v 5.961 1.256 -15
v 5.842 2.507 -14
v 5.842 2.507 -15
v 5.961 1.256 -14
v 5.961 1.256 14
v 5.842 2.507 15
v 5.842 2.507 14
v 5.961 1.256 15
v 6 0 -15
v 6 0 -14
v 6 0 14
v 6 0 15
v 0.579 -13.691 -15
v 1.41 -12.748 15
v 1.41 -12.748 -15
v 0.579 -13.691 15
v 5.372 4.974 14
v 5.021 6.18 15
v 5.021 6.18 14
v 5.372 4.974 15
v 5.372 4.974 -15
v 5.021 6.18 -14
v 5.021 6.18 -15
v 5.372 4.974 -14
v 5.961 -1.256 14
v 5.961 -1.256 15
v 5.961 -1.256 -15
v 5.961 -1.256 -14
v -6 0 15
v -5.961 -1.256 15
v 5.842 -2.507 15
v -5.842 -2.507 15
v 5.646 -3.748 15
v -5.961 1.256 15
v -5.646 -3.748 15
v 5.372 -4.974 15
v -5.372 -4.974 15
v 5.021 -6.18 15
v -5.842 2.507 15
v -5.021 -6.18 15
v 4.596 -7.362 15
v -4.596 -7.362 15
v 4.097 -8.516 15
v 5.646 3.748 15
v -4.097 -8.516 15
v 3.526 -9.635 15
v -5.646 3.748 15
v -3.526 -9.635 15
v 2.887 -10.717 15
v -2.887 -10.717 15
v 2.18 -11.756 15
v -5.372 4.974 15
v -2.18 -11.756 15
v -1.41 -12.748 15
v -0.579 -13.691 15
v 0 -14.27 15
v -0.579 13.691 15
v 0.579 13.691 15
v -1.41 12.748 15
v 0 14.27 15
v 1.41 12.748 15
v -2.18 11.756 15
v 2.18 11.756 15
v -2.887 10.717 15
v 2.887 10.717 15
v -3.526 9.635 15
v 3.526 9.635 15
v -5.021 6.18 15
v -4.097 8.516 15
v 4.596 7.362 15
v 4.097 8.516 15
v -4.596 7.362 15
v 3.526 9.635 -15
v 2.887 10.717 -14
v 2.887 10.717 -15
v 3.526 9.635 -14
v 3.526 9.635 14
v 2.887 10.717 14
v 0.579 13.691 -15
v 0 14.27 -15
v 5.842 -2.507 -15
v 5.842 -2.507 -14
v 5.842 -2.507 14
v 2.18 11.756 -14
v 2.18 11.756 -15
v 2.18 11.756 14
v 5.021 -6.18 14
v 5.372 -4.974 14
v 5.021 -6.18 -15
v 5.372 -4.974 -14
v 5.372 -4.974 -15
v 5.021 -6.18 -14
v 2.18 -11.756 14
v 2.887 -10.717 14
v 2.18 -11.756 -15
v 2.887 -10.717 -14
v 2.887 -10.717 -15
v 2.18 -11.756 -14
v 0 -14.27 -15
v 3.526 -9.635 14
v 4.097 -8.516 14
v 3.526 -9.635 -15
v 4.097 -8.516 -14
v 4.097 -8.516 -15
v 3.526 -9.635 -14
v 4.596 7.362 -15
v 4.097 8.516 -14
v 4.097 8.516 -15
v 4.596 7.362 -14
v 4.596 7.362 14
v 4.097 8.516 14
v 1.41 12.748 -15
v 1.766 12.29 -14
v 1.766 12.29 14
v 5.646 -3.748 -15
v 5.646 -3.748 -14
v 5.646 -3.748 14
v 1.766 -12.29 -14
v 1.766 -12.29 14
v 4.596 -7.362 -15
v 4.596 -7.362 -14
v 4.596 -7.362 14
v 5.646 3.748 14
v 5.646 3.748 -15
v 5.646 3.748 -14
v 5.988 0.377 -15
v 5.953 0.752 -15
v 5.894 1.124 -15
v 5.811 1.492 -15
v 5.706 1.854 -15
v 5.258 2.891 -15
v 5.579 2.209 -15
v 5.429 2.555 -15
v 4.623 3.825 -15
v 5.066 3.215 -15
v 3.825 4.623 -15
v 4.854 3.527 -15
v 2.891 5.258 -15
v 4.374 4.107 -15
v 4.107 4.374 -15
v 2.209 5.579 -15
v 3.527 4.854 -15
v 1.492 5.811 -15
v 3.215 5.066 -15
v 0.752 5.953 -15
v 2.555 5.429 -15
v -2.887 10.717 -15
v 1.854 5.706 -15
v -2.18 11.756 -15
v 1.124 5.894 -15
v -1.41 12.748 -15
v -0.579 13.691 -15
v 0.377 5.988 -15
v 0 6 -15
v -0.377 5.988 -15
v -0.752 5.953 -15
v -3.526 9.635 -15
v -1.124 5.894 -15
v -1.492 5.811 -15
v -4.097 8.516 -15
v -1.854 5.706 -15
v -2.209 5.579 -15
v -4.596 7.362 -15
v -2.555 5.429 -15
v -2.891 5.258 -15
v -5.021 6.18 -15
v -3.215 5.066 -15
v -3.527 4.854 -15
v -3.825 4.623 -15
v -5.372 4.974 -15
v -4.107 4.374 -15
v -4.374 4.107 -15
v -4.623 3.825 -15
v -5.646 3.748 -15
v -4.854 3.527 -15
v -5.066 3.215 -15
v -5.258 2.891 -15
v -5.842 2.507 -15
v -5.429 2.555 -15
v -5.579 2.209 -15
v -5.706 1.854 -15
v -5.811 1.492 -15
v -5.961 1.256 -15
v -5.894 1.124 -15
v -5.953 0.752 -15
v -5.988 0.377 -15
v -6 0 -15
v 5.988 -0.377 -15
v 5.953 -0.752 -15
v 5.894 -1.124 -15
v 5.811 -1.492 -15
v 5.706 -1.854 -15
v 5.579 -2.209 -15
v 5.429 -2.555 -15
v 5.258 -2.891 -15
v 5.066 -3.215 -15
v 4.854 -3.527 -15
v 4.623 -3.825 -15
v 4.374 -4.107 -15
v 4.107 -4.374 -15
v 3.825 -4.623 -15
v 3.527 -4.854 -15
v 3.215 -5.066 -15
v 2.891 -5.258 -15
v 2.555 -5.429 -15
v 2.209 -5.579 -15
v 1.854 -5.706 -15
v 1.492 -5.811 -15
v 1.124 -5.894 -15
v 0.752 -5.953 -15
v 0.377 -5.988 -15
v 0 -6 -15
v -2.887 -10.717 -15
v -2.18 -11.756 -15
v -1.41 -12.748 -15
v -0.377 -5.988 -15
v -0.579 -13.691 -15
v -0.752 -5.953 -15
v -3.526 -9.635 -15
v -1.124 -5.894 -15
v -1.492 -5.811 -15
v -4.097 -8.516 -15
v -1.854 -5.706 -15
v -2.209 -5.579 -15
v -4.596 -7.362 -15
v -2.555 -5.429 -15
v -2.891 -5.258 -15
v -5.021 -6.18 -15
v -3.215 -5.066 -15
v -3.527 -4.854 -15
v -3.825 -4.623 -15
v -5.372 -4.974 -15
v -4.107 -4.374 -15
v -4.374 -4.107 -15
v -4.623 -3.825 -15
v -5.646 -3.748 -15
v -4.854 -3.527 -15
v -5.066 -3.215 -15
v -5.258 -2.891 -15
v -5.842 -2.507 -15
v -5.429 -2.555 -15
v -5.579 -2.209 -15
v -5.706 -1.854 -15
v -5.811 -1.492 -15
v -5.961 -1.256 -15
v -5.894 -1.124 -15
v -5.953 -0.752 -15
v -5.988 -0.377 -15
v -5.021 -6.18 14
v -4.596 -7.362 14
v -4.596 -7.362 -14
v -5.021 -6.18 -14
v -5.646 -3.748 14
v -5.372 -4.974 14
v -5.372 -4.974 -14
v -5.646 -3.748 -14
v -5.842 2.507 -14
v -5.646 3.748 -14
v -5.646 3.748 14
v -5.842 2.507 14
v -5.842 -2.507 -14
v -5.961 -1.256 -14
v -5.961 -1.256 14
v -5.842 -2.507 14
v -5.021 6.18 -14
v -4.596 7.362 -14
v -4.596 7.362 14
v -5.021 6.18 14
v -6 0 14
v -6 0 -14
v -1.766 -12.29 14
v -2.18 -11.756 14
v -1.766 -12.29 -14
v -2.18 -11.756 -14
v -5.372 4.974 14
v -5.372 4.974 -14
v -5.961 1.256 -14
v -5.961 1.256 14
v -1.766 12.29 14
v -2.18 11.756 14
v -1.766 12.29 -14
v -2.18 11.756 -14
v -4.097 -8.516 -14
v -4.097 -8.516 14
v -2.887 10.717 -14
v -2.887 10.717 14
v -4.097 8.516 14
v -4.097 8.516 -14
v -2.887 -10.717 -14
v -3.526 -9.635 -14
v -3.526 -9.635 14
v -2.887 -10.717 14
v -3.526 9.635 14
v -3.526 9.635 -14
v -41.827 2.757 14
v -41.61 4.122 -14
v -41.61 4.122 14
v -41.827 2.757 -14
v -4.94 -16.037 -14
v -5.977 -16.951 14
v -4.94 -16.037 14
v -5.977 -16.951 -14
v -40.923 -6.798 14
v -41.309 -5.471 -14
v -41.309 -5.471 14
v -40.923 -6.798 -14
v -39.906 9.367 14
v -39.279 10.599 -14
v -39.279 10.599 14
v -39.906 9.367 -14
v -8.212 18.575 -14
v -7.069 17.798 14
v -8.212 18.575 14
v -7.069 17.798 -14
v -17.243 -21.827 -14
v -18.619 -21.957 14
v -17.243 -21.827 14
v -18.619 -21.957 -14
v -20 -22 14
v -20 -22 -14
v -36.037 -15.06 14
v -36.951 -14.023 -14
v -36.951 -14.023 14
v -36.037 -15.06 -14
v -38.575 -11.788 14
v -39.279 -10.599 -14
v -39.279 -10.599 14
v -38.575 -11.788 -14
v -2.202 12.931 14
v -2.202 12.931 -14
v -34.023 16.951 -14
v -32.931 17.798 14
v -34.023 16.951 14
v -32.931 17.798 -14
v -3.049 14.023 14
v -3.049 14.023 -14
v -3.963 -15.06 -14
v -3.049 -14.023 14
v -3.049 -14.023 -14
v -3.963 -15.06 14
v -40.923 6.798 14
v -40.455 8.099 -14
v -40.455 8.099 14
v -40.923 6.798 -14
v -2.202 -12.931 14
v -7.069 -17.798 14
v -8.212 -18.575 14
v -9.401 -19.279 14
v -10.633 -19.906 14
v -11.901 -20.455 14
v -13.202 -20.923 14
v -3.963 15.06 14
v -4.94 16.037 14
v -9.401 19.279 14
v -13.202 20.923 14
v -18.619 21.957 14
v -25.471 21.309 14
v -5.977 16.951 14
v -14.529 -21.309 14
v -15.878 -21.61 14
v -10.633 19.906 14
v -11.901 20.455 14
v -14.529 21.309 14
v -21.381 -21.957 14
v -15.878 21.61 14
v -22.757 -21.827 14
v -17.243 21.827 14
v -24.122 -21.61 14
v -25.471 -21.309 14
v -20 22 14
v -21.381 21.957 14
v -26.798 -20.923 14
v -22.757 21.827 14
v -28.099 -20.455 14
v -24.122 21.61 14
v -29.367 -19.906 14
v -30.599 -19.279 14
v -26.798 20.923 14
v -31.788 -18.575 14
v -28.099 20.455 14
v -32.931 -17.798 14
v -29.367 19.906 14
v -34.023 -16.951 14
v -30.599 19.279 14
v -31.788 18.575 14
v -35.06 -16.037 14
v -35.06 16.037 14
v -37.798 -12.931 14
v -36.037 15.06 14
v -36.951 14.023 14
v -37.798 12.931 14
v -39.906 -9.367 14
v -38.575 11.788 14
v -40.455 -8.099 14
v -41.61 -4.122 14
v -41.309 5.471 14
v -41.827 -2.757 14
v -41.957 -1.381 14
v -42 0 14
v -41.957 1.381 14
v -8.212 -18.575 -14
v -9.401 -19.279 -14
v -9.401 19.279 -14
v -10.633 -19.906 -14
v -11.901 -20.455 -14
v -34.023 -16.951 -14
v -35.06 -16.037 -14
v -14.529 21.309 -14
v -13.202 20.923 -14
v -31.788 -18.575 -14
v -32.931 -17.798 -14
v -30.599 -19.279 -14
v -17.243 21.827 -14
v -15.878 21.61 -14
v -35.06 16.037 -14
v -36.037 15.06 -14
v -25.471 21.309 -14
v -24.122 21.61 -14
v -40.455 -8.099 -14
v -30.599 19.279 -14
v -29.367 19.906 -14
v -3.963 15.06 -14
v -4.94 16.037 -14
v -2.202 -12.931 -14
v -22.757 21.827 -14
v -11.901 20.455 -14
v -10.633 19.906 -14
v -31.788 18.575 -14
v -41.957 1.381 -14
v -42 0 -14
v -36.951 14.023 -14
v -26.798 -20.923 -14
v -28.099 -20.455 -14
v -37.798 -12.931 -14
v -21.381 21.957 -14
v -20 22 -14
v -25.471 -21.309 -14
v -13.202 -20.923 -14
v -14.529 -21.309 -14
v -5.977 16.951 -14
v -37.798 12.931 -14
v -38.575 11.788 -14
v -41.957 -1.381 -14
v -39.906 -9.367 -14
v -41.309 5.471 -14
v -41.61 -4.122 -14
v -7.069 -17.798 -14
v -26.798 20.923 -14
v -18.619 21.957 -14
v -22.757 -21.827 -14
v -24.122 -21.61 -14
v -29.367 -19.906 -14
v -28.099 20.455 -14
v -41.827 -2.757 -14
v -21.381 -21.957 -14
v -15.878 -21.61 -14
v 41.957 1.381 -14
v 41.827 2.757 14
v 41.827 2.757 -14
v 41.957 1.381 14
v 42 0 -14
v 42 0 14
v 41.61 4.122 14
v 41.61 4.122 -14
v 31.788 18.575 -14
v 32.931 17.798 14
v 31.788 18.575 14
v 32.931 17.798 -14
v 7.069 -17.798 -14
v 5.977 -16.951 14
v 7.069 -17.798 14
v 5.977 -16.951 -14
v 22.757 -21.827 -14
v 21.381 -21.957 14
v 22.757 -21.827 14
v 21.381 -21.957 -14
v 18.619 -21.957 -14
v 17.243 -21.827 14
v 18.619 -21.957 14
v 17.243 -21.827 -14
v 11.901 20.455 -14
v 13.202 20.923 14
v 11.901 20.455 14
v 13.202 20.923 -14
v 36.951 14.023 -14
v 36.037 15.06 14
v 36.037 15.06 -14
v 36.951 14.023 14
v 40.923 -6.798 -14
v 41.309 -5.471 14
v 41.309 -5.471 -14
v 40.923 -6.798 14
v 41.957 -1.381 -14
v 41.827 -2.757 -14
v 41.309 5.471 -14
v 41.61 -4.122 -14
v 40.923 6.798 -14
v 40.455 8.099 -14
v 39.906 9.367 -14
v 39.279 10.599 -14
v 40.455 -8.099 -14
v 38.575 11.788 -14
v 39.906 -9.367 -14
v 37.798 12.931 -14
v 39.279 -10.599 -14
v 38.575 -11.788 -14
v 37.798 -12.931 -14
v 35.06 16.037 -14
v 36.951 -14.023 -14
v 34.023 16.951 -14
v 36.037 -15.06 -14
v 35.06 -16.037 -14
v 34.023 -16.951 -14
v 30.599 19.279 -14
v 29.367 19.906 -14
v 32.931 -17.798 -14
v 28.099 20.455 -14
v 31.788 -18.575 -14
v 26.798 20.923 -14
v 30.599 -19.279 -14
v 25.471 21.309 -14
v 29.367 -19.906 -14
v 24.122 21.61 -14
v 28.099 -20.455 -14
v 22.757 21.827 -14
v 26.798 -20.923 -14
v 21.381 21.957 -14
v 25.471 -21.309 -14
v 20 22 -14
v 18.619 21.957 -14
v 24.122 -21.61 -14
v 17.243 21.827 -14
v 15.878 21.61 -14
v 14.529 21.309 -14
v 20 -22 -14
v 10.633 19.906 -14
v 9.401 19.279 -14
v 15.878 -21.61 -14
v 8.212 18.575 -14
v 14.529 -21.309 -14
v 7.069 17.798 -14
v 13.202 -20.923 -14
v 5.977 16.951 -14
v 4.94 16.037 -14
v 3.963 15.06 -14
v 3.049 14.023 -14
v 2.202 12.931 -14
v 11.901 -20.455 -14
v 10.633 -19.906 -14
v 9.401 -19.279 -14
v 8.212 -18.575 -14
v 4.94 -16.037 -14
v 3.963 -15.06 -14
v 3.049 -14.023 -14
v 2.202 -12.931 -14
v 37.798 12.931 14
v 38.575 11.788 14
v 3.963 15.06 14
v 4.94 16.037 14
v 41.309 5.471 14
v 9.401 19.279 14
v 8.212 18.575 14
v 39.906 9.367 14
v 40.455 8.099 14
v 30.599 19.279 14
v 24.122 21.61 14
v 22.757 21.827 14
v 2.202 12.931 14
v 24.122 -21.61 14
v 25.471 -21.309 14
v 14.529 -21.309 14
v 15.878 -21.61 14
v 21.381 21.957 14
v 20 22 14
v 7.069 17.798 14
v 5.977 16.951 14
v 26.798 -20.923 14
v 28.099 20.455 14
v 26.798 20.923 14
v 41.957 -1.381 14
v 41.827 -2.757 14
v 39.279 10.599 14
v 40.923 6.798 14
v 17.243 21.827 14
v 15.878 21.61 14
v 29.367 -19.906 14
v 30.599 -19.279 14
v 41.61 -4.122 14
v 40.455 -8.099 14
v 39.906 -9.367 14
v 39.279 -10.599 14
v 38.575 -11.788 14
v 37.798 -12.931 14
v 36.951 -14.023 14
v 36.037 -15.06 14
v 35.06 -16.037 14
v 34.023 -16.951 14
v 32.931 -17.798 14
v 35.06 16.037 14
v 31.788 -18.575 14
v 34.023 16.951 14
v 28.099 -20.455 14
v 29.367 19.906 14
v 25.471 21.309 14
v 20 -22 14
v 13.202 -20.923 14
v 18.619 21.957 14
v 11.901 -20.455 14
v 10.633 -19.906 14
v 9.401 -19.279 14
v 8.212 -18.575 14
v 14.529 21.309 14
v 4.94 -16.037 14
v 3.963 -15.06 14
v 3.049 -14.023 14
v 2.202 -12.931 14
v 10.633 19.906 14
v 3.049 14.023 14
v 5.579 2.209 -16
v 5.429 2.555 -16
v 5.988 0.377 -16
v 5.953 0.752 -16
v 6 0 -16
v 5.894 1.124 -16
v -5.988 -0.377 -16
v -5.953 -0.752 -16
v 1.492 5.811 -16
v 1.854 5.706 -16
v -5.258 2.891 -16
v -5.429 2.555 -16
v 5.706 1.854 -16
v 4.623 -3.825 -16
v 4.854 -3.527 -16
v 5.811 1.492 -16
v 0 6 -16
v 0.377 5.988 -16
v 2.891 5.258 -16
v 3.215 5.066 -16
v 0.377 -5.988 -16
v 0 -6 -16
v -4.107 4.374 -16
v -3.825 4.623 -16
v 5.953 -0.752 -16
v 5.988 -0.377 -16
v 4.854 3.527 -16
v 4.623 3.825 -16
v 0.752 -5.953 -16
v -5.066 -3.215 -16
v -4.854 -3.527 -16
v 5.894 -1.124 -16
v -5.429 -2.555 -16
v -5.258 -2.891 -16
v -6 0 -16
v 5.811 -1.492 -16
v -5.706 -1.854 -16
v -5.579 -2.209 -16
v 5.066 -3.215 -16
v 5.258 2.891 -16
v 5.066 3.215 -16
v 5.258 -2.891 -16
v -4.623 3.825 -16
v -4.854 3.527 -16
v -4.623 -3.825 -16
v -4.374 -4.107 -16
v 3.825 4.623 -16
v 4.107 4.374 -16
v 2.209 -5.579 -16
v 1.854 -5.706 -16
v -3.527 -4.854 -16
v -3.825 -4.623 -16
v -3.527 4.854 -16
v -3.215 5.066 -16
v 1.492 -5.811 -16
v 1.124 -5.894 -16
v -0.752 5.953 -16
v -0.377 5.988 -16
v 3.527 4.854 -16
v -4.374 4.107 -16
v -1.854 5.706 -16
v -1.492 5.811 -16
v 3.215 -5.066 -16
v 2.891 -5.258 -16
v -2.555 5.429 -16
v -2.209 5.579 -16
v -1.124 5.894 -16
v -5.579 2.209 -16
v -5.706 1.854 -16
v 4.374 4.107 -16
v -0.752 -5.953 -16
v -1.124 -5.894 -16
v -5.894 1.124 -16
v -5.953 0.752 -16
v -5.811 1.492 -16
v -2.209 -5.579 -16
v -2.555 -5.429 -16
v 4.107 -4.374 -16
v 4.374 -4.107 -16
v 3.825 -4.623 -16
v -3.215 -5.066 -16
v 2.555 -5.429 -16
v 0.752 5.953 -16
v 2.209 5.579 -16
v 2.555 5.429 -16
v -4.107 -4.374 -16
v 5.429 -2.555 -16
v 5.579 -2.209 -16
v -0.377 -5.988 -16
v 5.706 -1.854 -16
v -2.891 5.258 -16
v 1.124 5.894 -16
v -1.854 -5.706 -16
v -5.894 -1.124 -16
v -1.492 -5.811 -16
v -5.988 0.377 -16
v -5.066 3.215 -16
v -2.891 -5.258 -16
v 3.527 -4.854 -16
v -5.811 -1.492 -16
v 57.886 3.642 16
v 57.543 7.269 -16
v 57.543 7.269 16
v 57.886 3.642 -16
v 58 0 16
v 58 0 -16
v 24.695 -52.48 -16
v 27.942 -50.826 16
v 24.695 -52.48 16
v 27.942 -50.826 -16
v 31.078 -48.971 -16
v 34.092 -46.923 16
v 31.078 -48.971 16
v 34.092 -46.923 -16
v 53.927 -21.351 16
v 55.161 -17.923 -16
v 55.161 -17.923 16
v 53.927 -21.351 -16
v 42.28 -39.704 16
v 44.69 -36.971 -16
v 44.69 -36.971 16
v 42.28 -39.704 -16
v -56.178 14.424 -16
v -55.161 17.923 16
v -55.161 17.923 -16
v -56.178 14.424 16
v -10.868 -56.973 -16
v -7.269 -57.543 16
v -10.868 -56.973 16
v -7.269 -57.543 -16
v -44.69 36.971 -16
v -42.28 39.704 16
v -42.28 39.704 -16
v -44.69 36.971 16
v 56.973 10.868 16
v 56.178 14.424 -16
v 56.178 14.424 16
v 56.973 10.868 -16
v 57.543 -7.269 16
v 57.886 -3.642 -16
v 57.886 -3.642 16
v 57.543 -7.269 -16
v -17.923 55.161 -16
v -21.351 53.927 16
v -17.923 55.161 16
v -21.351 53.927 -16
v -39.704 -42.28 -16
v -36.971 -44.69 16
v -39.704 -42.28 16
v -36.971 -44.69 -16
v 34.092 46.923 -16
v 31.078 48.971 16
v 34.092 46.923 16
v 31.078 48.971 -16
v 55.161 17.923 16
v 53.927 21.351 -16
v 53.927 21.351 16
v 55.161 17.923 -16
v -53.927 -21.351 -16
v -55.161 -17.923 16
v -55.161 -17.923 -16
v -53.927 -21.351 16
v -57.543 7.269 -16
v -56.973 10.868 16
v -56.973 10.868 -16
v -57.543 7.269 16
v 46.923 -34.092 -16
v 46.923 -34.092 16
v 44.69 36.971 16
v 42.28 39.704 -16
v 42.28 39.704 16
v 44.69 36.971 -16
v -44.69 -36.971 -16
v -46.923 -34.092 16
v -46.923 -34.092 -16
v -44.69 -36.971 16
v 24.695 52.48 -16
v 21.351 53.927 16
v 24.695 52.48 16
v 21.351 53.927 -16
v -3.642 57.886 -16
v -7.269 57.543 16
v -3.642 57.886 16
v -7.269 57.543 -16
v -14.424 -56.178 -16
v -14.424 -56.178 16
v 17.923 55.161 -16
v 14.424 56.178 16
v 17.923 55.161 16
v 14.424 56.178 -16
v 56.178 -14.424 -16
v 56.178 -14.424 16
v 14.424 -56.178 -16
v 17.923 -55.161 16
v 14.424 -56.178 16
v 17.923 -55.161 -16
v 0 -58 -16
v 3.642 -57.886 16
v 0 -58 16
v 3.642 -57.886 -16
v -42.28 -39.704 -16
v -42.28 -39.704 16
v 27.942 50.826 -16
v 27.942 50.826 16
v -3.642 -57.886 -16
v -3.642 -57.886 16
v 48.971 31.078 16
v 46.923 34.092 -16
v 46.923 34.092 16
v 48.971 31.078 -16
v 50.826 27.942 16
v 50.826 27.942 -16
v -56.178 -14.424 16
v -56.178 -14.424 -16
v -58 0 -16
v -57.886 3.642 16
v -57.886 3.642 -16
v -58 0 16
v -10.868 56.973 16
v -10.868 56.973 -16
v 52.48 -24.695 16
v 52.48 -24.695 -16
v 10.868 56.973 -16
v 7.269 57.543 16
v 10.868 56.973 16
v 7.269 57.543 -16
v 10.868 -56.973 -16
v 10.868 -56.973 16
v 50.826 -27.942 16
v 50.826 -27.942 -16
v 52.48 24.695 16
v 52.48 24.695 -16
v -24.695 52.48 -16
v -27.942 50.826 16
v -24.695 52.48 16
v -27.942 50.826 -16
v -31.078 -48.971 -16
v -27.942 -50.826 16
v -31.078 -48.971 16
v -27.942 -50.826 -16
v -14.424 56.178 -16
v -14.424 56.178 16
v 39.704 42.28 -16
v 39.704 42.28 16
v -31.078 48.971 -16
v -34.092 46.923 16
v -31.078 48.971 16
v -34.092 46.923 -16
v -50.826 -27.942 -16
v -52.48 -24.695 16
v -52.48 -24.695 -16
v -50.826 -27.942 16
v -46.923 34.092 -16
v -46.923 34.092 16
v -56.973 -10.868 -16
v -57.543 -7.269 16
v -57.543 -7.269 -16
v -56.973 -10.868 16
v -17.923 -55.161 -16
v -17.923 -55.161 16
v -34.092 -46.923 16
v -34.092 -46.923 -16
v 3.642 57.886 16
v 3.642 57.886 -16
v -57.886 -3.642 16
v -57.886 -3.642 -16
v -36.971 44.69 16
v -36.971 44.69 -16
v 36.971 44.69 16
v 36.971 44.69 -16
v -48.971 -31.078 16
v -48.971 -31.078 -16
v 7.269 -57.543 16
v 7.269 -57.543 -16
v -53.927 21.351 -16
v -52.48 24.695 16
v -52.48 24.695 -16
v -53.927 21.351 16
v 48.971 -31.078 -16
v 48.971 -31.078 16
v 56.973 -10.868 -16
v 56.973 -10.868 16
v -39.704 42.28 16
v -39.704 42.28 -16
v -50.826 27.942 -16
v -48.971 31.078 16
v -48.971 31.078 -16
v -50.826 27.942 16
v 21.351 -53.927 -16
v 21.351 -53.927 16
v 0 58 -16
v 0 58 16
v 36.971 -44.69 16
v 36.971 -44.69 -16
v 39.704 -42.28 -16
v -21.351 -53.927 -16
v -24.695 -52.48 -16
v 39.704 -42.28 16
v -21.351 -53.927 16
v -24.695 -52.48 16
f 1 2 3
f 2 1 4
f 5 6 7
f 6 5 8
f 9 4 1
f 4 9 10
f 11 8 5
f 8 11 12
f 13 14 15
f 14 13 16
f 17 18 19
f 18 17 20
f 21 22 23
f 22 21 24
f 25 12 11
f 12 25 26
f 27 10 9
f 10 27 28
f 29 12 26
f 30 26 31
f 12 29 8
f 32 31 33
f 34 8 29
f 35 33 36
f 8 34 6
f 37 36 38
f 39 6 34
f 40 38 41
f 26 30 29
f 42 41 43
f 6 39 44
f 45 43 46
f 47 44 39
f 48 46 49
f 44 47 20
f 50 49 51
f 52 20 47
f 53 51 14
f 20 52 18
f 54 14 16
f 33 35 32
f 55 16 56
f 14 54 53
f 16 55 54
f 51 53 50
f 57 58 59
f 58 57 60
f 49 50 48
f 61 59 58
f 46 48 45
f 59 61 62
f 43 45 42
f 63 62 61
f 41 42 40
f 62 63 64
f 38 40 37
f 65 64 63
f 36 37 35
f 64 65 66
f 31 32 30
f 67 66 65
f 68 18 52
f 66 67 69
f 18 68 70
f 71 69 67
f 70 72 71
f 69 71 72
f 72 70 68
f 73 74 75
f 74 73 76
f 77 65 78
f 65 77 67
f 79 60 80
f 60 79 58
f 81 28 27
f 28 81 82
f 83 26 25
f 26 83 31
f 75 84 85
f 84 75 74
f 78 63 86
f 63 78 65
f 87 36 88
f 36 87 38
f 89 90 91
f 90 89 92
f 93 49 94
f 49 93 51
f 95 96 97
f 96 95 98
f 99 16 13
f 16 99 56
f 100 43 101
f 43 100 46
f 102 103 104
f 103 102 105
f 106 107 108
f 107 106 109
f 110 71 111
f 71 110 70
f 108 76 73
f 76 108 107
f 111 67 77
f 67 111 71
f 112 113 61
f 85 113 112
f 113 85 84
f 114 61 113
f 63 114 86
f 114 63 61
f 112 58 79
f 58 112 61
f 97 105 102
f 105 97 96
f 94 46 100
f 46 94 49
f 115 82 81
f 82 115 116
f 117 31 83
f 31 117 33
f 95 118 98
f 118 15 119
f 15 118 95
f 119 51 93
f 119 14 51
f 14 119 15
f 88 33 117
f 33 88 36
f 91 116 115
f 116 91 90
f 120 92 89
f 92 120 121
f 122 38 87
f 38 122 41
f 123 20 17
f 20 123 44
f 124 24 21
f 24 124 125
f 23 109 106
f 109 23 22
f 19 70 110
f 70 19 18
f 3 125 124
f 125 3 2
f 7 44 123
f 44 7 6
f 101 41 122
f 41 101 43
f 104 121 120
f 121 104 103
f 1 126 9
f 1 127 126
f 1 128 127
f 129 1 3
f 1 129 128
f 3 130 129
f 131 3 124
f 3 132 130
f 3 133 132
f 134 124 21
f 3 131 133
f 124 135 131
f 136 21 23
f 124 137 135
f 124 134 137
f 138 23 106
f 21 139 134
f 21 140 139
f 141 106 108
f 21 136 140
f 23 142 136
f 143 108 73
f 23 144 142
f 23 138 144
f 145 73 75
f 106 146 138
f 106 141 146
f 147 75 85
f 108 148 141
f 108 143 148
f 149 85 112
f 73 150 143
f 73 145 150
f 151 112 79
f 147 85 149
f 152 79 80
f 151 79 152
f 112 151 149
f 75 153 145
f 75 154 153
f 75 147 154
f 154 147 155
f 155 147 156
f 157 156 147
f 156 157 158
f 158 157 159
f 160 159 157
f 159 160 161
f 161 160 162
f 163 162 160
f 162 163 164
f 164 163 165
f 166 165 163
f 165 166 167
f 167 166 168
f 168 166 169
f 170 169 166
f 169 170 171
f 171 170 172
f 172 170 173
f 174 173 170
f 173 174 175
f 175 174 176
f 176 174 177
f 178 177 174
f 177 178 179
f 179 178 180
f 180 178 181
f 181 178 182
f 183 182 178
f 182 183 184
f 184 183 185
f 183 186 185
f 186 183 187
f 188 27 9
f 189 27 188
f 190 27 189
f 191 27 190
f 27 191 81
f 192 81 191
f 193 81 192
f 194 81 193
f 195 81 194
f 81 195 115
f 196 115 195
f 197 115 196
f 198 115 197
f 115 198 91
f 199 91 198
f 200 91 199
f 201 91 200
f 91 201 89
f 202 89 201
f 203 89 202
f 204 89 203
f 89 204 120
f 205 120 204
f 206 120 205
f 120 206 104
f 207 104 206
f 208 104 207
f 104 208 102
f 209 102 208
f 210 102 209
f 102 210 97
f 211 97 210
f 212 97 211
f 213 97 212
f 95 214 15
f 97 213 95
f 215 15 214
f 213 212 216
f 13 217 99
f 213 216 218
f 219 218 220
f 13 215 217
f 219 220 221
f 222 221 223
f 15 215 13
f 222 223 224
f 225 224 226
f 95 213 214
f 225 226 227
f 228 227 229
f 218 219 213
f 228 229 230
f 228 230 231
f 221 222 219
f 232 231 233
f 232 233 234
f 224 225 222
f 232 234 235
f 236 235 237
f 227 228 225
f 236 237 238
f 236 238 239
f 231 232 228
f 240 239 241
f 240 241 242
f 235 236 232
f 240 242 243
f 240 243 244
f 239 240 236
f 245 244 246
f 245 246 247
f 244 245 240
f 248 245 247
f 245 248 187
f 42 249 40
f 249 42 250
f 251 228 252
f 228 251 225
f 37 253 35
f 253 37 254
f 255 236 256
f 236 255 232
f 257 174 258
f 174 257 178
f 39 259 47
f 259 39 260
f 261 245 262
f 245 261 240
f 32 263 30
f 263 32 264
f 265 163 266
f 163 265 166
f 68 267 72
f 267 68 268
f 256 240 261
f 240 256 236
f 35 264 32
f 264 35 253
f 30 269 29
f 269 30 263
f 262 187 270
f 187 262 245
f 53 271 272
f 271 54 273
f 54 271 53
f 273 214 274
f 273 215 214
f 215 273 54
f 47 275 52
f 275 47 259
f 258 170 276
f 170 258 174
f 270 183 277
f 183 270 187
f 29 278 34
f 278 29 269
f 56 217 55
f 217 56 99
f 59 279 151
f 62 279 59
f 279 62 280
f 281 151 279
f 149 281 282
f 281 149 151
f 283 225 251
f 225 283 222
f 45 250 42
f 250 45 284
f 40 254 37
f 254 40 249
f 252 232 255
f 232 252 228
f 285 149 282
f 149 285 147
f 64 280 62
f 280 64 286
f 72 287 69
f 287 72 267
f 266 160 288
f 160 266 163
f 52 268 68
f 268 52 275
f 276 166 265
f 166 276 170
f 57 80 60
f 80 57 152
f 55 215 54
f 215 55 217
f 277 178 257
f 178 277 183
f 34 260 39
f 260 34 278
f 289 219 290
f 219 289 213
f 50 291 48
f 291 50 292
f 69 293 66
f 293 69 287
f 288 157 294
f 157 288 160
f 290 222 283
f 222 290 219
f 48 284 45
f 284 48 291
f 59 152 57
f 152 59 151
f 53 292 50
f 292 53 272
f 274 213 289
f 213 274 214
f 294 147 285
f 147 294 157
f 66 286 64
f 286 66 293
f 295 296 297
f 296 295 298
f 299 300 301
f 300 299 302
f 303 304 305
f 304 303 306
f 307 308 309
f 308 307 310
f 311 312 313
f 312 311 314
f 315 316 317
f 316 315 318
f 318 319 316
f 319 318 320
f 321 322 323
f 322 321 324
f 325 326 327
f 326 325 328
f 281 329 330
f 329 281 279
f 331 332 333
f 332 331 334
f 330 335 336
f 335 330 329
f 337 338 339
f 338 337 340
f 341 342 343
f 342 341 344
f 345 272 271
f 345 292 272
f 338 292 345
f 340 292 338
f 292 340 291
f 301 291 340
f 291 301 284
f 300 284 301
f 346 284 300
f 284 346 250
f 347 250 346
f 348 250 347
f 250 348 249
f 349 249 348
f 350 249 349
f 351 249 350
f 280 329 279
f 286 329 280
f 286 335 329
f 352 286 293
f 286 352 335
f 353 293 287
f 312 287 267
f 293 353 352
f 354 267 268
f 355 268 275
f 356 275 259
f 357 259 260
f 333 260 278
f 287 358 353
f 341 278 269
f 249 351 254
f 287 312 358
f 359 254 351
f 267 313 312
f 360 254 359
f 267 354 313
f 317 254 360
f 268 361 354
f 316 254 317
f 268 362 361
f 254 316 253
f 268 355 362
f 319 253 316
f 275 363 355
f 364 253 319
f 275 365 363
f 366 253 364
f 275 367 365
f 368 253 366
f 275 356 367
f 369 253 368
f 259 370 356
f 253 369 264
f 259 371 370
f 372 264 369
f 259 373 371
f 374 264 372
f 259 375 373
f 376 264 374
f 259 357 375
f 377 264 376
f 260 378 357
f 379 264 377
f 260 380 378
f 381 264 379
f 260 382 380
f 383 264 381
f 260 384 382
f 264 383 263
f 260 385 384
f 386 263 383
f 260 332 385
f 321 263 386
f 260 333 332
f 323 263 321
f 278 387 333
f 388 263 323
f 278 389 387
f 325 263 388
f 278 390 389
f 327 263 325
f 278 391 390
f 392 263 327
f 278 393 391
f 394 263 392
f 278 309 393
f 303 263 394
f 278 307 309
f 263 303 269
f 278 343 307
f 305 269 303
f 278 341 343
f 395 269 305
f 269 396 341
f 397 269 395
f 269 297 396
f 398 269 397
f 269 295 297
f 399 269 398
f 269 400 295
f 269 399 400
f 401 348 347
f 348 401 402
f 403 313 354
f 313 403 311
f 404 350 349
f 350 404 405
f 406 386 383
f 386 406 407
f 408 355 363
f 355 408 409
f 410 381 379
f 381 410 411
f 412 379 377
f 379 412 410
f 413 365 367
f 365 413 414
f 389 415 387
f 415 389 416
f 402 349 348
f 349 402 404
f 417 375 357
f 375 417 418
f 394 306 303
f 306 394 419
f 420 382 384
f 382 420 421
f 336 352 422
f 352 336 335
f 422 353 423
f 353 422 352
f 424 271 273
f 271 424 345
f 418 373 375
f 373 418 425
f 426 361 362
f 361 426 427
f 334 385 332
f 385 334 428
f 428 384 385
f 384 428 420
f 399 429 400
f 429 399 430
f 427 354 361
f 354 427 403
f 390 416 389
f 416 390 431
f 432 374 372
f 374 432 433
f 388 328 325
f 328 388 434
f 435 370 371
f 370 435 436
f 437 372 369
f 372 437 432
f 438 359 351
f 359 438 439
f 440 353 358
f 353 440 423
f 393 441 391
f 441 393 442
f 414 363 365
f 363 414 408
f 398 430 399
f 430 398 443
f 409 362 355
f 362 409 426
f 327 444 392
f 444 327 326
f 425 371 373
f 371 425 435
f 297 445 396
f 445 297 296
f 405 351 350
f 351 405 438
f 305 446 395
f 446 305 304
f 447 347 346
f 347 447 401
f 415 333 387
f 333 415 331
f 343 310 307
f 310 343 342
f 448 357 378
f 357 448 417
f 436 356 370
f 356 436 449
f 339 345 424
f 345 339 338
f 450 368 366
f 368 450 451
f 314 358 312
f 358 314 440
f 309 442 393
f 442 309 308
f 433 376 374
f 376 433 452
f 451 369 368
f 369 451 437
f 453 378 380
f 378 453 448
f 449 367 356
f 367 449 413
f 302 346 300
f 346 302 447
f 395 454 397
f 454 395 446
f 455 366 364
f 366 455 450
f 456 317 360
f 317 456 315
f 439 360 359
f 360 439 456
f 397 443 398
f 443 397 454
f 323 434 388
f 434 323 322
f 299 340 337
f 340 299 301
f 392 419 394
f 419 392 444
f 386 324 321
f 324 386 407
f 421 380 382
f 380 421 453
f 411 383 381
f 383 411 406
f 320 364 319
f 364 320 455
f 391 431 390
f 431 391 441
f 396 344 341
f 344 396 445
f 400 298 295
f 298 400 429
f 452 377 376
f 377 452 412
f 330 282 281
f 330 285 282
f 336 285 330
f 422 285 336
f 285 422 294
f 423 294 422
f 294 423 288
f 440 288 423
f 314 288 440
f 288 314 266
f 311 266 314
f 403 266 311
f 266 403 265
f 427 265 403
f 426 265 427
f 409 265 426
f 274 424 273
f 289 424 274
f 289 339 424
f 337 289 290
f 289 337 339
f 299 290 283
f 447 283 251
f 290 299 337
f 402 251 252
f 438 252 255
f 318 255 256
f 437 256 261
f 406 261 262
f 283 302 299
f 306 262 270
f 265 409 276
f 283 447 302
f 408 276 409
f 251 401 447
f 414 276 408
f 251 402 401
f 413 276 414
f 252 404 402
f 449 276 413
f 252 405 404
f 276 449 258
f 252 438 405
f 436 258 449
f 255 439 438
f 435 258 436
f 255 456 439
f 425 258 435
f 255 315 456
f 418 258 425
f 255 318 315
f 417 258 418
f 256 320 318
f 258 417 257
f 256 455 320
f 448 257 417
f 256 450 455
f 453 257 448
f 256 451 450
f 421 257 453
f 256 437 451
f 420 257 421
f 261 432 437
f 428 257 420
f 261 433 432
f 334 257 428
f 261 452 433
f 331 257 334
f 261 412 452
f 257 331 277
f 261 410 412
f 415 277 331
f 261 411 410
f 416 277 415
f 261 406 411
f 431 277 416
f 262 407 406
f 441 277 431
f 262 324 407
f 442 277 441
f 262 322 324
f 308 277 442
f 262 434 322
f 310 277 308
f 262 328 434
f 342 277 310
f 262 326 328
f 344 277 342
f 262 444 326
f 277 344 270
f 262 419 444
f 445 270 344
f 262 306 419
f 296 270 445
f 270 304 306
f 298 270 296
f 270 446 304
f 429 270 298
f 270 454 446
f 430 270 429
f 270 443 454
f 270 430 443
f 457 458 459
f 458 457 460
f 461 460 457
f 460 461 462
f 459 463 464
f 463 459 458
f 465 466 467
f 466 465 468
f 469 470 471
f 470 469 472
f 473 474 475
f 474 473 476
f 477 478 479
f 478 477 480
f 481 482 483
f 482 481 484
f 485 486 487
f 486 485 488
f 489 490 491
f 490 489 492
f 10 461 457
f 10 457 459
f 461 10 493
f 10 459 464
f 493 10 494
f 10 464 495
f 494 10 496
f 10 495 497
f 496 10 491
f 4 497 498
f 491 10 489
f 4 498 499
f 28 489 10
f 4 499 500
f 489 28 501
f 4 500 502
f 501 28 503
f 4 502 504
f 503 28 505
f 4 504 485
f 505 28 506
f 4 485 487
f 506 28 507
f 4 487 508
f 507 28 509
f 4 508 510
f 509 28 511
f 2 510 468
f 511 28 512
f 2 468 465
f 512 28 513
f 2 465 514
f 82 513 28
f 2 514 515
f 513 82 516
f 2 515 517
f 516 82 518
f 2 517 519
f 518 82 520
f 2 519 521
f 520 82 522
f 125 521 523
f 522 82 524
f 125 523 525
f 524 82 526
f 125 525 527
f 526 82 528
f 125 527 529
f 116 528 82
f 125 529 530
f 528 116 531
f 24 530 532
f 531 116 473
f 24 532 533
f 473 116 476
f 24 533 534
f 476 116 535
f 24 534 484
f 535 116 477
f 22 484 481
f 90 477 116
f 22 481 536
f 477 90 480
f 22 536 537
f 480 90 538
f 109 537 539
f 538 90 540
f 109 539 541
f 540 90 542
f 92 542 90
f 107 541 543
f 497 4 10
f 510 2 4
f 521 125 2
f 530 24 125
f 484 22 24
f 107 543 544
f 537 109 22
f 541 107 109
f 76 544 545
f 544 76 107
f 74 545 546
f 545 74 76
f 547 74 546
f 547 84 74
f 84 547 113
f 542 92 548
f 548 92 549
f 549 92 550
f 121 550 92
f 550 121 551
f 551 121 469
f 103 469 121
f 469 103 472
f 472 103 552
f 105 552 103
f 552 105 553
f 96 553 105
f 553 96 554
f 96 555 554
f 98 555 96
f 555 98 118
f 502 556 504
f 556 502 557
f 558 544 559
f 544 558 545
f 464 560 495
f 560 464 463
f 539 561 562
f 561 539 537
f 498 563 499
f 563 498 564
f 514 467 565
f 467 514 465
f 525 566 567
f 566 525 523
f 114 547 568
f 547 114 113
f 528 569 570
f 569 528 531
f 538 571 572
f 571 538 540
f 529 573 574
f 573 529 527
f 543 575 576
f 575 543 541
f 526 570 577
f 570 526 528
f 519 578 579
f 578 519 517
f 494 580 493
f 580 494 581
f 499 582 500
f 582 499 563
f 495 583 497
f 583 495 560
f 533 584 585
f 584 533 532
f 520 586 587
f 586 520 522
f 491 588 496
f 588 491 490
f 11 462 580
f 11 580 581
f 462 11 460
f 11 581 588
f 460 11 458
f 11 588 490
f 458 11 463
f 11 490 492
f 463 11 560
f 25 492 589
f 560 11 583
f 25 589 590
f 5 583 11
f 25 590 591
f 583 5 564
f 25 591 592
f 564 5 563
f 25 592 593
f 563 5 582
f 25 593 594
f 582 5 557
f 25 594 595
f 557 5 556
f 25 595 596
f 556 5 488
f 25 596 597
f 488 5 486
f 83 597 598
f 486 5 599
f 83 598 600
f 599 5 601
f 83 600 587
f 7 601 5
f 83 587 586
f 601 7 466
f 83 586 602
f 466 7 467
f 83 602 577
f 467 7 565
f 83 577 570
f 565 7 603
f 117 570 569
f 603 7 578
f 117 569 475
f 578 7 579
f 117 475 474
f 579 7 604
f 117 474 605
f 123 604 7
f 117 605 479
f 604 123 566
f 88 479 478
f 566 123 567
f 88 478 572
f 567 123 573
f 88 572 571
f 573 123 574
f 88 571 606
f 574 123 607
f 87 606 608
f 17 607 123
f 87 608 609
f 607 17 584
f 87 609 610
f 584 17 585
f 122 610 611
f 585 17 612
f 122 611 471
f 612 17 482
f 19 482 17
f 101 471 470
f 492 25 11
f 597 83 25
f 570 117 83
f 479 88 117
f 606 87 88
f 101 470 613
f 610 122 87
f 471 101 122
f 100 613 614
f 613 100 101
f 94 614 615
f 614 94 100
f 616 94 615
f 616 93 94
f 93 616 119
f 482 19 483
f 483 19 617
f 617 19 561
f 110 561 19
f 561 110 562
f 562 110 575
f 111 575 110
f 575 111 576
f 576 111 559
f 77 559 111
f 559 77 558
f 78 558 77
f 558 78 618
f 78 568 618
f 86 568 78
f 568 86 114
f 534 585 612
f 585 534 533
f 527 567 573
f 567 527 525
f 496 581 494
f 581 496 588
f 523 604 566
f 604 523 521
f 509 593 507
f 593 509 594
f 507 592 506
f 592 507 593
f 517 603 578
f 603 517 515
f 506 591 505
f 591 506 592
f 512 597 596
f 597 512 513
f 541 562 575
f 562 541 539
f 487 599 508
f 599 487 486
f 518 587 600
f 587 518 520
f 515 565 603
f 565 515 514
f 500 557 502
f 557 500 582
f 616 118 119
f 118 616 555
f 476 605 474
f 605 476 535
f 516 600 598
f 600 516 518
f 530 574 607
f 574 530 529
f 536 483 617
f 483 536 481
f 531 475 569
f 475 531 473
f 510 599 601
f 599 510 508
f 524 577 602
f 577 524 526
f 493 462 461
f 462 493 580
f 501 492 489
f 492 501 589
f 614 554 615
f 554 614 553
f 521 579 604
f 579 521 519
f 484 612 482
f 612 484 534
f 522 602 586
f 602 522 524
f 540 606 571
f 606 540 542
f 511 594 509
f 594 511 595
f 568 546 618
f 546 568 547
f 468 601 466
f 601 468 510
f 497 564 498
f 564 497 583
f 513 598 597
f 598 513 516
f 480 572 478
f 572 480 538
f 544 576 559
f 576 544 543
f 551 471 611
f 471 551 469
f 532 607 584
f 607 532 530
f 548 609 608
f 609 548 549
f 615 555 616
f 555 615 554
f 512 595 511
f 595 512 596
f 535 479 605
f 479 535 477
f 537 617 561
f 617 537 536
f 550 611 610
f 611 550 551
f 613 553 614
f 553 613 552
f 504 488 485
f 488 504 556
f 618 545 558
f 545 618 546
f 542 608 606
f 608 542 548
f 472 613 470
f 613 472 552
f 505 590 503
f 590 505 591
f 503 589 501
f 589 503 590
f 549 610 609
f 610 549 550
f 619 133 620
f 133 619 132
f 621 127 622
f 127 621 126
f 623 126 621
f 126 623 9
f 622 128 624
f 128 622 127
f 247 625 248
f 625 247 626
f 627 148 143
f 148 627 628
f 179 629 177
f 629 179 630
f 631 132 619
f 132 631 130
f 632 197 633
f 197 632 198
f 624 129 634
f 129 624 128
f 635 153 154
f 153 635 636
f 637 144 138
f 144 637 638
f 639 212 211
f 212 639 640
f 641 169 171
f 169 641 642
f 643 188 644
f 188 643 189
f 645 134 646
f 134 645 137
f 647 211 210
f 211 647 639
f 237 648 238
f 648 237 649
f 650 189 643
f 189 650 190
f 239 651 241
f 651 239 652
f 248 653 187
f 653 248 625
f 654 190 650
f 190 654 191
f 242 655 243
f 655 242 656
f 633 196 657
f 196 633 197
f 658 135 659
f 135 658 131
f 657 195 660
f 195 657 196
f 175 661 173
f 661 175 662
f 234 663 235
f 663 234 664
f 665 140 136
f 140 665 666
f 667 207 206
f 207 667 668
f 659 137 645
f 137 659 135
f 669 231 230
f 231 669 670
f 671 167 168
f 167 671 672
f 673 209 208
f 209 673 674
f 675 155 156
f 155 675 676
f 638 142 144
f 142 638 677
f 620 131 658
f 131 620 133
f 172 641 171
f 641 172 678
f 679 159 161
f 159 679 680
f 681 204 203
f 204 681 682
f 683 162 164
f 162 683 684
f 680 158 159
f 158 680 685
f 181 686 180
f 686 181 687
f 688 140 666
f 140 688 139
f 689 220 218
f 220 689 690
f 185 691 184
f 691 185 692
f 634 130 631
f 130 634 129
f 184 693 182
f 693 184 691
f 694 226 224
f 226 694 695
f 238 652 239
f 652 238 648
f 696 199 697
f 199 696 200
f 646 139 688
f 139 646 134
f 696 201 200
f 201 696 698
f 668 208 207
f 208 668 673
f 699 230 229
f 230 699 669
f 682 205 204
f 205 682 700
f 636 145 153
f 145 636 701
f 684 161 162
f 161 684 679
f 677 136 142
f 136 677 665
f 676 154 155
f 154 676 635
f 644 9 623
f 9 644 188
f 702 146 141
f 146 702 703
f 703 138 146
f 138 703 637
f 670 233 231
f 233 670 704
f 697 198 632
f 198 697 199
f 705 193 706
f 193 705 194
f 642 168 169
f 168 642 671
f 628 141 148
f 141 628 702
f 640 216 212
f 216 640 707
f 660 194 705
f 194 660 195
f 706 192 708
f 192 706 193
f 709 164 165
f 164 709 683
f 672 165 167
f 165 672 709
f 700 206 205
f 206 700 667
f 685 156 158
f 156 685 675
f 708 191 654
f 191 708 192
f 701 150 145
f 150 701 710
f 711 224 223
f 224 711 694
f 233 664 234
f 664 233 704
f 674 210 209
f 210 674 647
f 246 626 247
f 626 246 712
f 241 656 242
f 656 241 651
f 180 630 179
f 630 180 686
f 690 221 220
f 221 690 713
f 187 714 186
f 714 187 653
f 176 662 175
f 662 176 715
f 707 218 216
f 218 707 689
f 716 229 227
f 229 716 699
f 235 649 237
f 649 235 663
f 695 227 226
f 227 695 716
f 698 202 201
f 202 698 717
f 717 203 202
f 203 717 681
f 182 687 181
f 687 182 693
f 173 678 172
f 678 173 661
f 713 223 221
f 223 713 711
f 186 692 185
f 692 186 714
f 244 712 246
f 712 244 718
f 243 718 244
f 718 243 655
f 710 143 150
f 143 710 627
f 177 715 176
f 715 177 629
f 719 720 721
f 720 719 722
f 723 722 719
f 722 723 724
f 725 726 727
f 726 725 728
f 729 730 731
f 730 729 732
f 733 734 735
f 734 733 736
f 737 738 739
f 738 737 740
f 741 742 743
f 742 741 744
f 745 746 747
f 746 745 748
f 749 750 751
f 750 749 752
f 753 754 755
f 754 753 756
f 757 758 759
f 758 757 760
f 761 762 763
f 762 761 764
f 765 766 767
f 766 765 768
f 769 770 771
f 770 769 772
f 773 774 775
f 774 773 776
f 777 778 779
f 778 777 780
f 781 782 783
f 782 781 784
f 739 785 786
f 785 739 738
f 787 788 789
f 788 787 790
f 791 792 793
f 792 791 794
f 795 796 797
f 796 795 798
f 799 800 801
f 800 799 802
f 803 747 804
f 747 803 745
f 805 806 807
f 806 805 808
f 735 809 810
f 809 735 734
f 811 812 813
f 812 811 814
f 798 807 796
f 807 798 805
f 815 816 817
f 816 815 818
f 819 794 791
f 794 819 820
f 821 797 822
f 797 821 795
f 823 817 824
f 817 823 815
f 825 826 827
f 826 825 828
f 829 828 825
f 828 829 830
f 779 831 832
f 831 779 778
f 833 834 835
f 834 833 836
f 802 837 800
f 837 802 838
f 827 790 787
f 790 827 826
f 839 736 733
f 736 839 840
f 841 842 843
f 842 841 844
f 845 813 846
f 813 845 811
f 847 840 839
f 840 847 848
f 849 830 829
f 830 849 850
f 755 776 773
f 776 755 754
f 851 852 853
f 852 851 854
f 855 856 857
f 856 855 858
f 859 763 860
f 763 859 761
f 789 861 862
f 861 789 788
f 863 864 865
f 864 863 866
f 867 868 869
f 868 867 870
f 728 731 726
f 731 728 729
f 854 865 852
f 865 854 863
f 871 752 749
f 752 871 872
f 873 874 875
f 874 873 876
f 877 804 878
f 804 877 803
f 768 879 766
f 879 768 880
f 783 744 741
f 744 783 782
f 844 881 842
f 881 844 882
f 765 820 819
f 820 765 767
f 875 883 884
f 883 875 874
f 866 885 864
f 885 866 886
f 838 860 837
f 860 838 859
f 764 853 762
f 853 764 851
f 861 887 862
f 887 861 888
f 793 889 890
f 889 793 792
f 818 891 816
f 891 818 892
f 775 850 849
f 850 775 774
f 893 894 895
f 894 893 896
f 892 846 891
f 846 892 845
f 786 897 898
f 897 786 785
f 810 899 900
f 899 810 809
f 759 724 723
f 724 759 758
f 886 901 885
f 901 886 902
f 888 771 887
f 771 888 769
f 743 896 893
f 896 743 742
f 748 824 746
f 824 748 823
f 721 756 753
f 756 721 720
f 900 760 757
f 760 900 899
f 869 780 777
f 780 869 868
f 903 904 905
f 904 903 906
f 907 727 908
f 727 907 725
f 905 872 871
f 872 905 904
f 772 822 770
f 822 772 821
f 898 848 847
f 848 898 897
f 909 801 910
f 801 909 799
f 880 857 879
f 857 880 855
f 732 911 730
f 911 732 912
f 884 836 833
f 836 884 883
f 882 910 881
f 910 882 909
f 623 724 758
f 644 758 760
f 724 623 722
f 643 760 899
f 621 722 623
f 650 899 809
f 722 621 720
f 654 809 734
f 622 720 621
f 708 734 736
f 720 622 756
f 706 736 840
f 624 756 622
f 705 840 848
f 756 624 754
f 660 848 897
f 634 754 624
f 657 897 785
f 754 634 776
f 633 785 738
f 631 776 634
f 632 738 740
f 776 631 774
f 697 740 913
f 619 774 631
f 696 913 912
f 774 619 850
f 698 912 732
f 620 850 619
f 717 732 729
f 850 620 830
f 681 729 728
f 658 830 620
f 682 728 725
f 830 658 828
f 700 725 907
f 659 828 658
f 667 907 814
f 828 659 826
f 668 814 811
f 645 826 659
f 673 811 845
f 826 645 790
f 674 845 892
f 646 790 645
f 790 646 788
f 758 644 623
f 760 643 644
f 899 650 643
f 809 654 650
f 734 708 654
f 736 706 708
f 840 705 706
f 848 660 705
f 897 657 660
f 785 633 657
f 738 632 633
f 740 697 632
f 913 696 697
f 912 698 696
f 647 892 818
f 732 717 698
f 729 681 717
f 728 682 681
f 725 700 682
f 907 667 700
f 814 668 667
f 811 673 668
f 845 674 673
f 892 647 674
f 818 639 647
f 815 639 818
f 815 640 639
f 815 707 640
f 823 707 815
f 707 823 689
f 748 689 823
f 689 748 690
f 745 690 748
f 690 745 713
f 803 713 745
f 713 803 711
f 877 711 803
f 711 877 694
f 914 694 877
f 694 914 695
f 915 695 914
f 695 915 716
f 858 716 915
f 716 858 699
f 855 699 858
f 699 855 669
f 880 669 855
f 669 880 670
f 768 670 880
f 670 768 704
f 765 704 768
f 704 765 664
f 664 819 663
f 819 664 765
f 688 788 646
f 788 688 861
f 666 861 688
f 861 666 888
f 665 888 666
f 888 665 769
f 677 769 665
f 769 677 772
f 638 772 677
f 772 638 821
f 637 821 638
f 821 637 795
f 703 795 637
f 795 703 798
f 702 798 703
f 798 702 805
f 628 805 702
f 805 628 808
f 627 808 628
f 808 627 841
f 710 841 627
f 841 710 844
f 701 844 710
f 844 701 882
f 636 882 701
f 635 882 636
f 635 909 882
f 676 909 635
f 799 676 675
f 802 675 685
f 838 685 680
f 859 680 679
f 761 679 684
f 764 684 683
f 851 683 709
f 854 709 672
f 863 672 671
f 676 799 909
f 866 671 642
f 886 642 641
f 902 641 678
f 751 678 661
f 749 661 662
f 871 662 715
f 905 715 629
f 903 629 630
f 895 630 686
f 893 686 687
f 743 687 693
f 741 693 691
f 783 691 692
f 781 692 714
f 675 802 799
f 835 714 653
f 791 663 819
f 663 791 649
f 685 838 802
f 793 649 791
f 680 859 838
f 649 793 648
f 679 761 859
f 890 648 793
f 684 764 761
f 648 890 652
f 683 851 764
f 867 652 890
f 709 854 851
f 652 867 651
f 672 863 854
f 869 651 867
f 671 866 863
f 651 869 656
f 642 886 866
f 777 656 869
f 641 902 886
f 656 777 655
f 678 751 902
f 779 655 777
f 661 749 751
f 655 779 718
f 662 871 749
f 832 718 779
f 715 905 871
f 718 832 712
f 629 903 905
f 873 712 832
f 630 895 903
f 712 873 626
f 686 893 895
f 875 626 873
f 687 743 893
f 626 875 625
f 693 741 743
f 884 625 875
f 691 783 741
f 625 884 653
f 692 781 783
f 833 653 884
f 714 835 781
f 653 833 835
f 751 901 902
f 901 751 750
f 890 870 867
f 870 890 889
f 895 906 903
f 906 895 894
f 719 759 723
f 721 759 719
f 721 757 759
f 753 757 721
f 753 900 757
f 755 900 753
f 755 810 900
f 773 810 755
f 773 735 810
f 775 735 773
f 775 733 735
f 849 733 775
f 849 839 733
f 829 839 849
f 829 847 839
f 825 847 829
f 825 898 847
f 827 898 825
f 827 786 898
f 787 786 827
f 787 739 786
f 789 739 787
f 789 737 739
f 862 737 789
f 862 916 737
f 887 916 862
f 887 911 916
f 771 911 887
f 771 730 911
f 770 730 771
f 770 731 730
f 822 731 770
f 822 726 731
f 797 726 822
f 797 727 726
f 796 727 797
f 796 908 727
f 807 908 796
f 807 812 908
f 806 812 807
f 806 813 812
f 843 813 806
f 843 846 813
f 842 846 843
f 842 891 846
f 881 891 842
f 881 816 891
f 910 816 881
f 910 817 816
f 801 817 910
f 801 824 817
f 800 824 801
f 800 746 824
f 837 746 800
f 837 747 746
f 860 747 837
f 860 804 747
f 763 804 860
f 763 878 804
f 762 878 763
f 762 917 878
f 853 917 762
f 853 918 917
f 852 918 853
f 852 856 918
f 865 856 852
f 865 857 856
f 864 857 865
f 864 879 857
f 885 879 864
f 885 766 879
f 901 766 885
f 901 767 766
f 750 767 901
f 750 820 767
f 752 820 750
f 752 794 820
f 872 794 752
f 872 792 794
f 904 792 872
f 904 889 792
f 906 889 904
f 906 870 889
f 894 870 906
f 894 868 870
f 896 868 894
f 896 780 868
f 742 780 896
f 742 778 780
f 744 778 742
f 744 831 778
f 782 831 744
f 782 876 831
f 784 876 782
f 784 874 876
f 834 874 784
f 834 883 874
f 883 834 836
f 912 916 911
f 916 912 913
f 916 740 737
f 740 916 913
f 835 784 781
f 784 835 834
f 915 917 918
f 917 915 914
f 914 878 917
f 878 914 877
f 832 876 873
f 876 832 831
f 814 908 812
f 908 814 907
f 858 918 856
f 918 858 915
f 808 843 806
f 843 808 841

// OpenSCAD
// ========================================================================
// PROJECT: LCN-88 Solid-State Fluidic Collision Chamber
// LICENSING: CERN Open Hardware License V2 - Strongly Reciprocal (CERN-OHL-S-2.0)
// REPOSITORY: https://github.com
// DESCRIPTION: Torus outer boundary enclosing a parametric Lemniscate 
//              (Figure-8) fluidic path that drives counter-rotating vortices
//              into an implosion collision at a central Vesica Piscis lens.
// COORDINATES: Center Singularity Node locked at absolute vector (0, 0, 0)
// ========================================================================

$fn = 100; // Sets rendering matrix resolution array

// --- MAIN ARCHITECTURAL DIFFERENCE MATRIX ---
difference() {
    
    // 1. THE BEAST BOUNDARY: Solid, high-durability outer protective shell 
    outer_chamber_boundary(outer_radius = 58, chamber_height = 32);
    
    // 2. THE CHANNELS MATRIX: Hollowed out fluid pathways and zero-point core
    union() {
        // Left Counter-Clockwise Intake Loop of the Lemniscate
        fluidic_vortex_loop(offset_x = -20, loop_radius = 22, fluid_depth = 28);
        
        // Right Clockwise Intake Loop of the Lemniscate
        fluidic_vortex_loop(offset_x = 20, loop_radius = 22, fluid_depth = 28);
        
        // The Vesica Piscis Central Implosion Hub at coordinate (0, 0, 0)
        vesica_piscis_singularity(overlap_dist = 14, lens_radius = 20, fluid_depth = 30);
        
        // The Rod of Iron: Central Bottom Drainage/Hyper-Oxygenated Output Jet
        translate([0, 0, -20])
            cylinder(r = 6, h = 42, center = true);
    }
}

// --- SOVEREIGN DESIGN ENGINE MODULES ---

module outer_chamber_boundary(outer_radius, chamber_height) {
    // Forges a thick, high-pressure containment perimeter for the fluidic shear
    cylinder(r = outer_radius, h = chamber_height, center = true);
}

module fluidic_vortex_loop(offset_x, loop_radius, fluid_depth) {
    // Accelerates incoming stormwater into clean, high-velocity circular orbits
    translate([offset_x, 0, 0])
        cylinder(r = loop_radius, h = fluid_depth, center = true);
}

module vesica_piscis_singularity(overlap_dist, lens_radius, fluid_depth) {
    // Intersects two overlapping circles to create the almond-shaped lens 
    // where dual counter-rotating streams undergo absolute geometric collision.
    intersection() {
        translate([-overlap_dist, 0, 0])
            cylinder(r = lens_radius, h = fluid_depth, center = true);
        translate([overlap_dist, 0, 0])
            cylinder(r = lens_radius, h = fluid_depth, center = true);
    }
}
